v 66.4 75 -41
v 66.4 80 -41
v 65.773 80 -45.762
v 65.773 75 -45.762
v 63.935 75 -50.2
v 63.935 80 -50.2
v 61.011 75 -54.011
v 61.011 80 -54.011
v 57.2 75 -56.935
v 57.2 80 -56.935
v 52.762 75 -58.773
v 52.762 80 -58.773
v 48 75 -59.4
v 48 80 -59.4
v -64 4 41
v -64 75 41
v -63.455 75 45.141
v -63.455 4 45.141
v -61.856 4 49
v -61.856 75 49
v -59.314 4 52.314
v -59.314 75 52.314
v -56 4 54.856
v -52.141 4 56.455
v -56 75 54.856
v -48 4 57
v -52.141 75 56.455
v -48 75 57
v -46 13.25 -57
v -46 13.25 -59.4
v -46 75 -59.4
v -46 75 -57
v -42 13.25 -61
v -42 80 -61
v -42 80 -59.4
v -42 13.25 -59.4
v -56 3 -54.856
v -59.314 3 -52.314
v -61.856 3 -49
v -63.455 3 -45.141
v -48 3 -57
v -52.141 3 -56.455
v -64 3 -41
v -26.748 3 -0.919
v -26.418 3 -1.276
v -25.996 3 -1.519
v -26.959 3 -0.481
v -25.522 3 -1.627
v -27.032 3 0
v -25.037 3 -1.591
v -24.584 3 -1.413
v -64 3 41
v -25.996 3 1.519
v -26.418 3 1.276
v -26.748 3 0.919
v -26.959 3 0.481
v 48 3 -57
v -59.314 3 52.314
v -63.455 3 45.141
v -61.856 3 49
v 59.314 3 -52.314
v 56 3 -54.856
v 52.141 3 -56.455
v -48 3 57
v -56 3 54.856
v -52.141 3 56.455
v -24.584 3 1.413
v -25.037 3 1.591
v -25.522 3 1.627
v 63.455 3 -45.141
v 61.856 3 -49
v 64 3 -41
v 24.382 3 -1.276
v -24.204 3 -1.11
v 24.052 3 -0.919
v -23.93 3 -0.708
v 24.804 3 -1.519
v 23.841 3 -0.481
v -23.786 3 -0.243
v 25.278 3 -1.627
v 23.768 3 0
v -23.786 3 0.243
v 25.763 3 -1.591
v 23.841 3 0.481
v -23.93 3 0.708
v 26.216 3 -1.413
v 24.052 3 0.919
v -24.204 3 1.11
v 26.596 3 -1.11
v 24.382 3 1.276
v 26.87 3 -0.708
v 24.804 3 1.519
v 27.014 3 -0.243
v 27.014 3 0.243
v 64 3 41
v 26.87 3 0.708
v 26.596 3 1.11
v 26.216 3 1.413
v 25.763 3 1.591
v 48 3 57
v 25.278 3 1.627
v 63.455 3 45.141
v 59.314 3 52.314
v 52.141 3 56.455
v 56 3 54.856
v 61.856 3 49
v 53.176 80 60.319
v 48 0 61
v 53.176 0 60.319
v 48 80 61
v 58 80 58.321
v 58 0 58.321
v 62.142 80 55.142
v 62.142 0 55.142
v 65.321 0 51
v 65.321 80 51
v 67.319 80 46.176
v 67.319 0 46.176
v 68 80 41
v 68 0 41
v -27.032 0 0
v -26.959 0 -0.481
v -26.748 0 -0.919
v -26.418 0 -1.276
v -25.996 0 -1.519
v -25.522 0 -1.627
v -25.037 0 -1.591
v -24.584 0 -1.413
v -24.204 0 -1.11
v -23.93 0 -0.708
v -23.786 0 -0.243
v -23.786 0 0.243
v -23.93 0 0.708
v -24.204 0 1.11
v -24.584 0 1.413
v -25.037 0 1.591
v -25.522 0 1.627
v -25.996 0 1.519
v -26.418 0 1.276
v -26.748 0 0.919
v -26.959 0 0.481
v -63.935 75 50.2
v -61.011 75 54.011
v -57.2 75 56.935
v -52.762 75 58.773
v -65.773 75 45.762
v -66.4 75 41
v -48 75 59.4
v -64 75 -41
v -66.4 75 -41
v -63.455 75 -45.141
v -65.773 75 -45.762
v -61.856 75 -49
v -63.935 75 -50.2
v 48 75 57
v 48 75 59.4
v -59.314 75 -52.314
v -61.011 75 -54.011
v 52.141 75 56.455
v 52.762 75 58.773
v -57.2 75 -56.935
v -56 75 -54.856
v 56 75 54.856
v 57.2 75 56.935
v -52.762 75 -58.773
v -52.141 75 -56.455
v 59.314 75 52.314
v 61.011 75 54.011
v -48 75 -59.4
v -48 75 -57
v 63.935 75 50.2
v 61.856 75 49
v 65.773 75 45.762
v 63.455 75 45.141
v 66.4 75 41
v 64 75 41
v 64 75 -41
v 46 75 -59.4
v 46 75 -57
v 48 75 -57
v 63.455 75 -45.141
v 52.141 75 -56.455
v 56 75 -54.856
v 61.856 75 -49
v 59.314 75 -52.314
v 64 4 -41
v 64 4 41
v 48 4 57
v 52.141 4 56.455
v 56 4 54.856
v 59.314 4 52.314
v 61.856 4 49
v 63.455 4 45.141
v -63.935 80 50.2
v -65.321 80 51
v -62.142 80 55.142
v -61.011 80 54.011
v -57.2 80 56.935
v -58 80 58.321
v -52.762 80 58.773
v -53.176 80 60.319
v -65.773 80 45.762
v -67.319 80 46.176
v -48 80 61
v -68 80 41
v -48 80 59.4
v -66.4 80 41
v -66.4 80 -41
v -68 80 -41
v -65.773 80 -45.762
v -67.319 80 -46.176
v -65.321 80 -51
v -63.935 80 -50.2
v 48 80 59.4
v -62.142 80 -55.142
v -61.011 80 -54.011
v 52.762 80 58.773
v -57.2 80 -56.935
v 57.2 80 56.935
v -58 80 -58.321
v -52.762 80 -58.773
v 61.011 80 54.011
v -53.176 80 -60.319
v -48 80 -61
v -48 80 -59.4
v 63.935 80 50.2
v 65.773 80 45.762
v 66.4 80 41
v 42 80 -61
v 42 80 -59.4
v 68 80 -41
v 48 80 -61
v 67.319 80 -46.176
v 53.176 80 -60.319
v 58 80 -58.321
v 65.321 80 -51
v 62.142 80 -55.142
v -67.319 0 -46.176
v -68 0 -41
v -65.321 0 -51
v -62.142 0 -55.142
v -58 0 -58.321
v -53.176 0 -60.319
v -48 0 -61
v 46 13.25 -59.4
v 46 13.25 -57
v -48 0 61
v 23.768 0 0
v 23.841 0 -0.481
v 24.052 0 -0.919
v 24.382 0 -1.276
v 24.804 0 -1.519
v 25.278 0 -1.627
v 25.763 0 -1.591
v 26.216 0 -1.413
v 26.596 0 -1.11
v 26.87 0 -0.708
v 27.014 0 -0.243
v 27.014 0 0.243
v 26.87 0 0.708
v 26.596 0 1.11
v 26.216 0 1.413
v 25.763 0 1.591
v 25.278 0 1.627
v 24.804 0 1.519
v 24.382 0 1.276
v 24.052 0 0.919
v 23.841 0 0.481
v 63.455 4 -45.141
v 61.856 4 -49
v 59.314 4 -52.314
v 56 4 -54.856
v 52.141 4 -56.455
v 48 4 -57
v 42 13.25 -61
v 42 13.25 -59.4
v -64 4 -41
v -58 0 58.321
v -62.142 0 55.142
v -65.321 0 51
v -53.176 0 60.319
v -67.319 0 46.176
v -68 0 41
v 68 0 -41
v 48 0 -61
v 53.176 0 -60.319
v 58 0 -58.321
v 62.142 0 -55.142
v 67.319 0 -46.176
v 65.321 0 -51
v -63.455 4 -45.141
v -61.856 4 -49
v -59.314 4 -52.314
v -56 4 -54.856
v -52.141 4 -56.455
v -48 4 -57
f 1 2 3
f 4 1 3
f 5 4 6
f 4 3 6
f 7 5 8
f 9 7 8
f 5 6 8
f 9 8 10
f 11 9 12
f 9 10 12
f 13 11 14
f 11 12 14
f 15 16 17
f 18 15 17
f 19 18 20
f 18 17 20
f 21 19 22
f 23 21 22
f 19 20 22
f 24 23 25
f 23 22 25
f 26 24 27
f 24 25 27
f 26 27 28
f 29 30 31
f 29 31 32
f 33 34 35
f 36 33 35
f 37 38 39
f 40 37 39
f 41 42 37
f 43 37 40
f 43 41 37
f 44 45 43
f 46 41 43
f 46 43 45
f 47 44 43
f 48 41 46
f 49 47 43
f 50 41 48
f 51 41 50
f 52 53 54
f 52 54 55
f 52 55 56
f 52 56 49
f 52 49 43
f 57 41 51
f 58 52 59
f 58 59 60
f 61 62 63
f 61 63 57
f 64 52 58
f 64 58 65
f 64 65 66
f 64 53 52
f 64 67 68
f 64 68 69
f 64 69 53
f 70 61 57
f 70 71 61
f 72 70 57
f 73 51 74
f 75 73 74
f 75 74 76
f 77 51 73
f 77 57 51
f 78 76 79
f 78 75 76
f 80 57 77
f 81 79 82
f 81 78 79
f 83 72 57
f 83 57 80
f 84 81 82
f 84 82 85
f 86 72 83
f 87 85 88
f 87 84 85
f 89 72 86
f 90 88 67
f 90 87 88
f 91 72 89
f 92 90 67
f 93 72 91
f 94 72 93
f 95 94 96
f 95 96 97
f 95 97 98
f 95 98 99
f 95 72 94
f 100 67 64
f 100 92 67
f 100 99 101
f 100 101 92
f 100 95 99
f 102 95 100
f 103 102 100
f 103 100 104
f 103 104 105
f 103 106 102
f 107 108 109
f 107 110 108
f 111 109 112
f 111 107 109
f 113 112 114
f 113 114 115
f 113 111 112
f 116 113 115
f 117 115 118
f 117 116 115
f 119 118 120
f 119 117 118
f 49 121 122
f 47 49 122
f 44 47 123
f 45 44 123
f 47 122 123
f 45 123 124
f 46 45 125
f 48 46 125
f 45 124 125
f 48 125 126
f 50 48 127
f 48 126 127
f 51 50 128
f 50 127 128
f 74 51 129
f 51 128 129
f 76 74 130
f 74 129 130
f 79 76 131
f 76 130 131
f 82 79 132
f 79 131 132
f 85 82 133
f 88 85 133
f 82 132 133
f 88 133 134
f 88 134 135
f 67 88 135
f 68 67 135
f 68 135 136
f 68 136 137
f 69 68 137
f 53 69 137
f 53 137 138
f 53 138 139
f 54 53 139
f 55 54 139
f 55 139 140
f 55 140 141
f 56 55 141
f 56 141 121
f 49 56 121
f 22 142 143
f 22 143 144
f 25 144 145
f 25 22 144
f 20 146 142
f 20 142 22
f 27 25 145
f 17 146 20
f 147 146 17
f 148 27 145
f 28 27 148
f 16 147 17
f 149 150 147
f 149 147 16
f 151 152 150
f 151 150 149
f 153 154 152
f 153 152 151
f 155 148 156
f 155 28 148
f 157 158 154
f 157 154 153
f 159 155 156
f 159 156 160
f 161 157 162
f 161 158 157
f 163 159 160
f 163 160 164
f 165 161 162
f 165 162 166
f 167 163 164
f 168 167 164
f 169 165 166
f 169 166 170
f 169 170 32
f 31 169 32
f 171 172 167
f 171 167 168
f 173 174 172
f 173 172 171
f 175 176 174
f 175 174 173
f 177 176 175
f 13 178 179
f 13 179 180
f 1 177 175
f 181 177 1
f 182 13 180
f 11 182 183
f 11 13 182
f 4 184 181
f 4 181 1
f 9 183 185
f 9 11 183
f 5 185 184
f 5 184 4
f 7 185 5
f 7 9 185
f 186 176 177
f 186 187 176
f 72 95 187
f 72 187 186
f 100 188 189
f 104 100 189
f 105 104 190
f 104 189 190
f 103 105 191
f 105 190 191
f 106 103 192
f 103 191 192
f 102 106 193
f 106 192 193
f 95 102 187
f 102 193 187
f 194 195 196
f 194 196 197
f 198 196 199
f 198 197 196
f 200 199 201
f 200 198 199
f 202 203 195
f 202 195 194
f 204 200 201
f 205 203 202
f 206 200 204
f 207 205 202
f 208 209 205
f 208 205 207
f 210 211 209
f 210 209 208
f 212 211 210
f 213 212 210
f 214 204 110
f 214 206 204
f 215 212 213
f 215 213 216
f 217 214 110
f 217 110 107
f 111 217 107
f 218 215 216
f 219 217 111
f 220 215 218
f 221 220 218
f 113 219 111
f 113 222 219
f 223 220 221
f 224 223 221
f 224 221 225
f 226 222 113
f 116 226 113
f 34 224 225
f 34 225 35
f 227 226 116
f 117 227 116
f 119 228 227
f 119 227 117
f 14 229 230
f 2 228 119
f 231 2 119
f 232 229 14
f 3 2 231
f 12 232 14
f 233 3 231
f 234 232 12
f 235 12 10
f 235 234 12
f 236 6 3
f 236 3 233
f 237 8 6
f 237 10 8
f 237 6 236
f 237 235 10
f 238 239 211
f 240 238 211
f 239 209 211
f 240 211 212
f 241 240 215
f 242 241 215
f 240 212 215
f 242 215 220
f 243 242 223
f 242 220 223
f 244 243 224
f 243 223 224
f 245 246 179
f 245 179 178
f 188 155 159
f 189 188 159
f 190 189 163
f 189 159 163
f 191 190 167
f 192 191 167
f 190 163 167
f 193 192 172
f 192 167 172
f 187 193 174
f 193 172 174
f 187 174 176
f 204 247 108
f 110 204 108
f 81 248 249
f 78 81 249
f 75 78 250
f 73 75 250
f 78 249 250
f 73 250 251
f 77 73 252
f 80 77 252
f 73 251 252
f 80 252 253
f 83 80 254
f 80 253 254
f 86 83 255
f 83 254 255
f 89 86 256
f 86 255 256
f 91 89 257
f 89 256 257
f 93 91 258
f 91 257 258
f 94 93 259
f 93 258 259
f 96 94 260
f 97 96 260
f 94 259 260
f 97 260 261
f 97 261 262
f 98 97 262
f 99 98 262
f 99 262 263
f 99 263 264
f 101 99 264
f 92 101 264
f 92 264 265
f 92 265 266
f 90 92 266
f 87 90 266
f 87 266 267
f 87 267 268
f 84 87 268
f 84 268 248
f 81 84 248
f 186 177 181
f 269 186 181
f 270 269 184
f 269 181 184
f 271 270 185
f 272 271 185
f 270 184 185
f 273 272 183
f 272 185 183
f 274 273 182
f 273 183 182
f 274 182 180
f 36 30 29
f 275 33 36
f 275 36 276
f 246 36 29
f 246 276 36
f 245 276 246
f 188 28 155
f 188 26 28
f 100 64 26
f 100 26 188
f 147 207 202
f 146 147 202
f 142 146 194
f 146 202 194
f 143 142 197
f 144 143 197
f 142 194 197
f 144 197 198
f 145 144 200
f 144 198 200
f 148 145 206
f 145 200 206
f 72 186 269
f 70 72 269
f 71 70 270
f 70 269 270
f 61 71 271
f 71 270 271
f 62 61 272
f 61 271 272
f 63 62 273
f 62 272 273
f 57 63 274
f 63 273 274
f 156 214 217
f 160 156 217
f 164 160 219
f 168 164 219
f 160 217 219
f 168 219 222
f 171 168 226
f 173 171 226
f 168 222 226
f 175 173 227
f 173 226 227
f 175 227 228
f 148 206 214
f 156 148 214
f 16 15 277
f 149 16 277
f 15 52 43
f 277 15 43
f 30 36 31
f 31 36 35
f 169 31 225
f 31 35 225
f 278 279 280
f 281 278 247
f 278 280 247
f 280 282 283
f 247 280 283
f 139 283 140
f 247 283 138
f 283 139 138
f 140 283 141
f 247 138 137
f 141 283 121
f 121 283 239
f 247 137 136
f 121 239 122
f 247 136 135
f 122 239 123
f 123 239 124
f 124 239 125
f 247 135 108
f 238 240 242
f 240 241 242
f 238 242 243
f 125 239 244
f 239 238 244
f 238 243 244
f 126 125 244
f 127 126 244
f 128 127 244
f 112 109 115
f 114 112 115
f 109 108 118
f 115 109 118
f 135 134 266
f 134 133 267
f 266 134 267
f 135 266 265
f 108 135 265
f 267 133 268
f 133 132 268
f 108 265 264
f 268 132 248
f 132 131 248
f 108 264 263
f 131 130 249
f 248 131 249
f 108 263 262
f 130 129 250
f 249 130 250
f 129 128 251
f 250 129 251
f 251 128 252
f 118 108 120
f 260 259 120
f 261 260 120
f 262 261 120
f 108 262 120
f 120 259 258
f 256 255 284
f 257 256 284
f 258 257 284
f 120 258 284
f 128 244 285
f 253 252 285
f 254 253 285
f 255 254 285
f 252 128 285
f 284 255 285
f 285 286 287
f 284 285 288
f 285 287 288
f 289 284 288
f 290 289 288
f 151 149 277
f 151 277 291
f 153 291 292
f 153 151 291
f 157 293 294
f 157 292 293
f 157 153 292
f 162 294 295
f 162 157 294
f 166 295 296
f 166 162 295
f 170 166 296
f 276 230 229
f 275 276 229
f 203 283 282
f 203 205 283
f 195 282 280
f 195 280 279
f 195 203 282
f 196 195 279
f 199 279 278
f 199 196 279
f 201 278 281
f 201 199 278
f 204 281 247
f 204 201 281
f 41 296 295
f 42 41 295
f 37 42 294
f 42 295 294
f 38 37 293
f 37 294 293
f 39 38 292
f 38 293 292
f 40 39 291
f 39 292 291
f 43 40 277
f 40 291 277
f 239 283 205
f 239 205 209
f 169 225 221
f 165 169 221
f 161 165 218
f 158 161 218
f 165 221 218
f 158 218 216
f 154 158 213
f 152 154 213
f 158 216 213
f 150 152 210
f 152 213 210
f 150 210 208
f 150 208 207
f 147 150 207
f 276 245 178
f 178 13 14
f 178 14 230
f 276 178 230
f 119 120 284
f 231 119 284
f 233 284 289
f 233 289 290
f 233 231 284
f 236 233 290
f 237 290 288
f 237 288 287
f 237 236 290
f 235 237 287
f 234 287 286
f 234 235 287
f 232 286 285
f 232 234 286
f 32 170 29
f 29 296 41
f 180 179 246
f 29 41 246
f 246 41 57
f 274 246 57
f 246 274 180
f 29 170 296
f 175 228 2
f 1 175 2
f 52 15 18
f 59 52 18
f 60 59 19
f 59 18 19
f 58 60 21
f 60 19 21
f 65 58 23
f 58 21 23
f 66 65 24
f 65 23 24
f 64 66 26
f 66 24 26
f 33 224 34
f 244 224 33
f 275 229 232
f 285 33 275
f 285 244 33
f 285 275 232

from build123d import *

# Parameters (mm, degrees)
SKETCH1_W                = 136
SKETCH1_H                = 122
BOSS_EXTRUDE1_DEPTH      = 80
FILLET1_R                = 20
SHELL1_T                 = -4
SHELL1_THICKNESS_2_DEPTH = 1
CUT_EXTRUDE2_DEPTH       = 5
F_4_CLEARANCE_HOLE1_D    = 3.2639
CUT_EXTRUDE3_DEPTH       = 66.75


with BuildPart() as part:
    # Sketch1 → Boss-Extrude1 (new body)
    with BuildSketch(Plane(origin=(0, 0, 0), x_dir=(1, 0, 0), z_dir=(0, 1, 0))):
        Rectangle(SKETCH1_W, SKETCH1_H)
    extrude(amount=BOSS_EXTRUDE1_DEPTH)

    # Fillet1
    fillet1_edges = [part.edges().sort_by_distance(p)[0] for p in [
        (68, 40, 61),
        (-68, 40, 61),
        (-68, 40, -61),
        (68, 40, -61),
    ]]
    fillet(fillet1_edges, radius=FILLET1_R)

    # Shell1
    shell1_openings = [part.faces().sort_by_distance(p)[0] for p in [
        (0, 80, 0),
    ]]
    offset(amount=SHELL1_T, openings=shell1_openings, kind=Kind.INTERSECTION)

    # Shell1 thickness 2 face (on inner face of the shell) → Shell1 thickness 2 (cut)
    with BuildSketch(Plane(origin=(0, 4, 0), x_dir=(0, 0, -1), z_dir=(0, -1, 0))):
        with BuildLine():
            ThreePointArc((57, -48), (52.313708499, -59.313708499), (41, -64))
            Line((41, -64), (-41, -64))
            ThreePointArc((-41, -64), (-52.313708499, -59.313708499), (-57, -48))
            Line((-57, -48), (-57, 48))
            ThreePointArc((-57, 48), (-52.313708499, 59.313708499), (-41, 64))
            Line((-41, 64), (41, 64))
            ThreePointArc((41, 64), (52.313708499, 59.313708499), (57, 48))
            Line((57, 48), (57, -48))
        make_face()
    extrude(amount=SHELL1_THICKNESS_2_DEPTH, mode=Mode.SUBTRACT)

    # Sketch5 → Cut-Extrude2 (cut)
    with BuildSketch(Plane(origin=(0, 80, 0), x_dir=(1, 0, 0), z_dir=(0, 1, 0))):
        with BuildLine():
            Line((48, 59.4), (-48, 59.4))
            ThreePointArc((-48, 59.4), (-61.010764774, 54.010764774), (-66.4, 41))
            Line((-66.4, 41), (-66.4, -41))
            ThreePointArc((-66.4, -41), (-61.010764774, -54.010764774), (-48, -59.4))
            Line((-48, -59.4), (48, -59.4))
            ThreePointArc((48, -59.4), (61.010764774, -54.010764774), (66.4, -41))
            Line((66.4, -41), (66.4, 41))
            ThreePointArc((66.4, 41), (61.010764774, 54.010764774), (48, 59.4))
        make_face()
        with BuildLine():
            Line((48, 57), (-48, 57))
            ThreePointArc((-48, 57), (-59.313708499, 52.313708499), (-64, 41))
            Line((-64, 41), (-64, -41))
            ThreePointArc((-64, -41), (-59.313708499, -52.313708499), (-48, -57))
            Line((-48, -57), (48, -57))
            ThreePointArc((48, -57), (59.313708499, -52.313708499), (64, -41))
            Line((64, -41), (64, 41))
            ThreePointArc((64, 41), (59.313708499, 52.313708499), (48, 57))
        make_face(mode=Mode.SUBTRACT)
    extrude(amount=-CUT_EXTRUDE2_DEPTH, mode=Mode.SUBTRACT)

    # #4 Clearance Hole1 (through all)
    with Locations(Plane(origin=(0, 3, 0), x_dir=(1, 0, 0), z_dir=(0, 1, 0))):
        with Locations((-25.4, 0), (25.4, 0)):
            Hole(F_4_CLEARANCE_HOLE1_D / 2)

    # Sketch8 → Cut-Extrude3 (cut)
    with BuildSketch(Plane(origin=(0, 80, 0), x_dir=(1, 0, 0), z_dir=(0, 1, 0))):
        Polygon((42, 61), (-42, 61), (-42, 59.4), (-46, 59.4), (-46, 57), (46, 57), (46, 59.4), (42, 59.4), align=None)
    extrude(amount=-CUT_EXTRUDE3_DEPTH, mode=Mode.SUBTRACT)


solid = part.part
